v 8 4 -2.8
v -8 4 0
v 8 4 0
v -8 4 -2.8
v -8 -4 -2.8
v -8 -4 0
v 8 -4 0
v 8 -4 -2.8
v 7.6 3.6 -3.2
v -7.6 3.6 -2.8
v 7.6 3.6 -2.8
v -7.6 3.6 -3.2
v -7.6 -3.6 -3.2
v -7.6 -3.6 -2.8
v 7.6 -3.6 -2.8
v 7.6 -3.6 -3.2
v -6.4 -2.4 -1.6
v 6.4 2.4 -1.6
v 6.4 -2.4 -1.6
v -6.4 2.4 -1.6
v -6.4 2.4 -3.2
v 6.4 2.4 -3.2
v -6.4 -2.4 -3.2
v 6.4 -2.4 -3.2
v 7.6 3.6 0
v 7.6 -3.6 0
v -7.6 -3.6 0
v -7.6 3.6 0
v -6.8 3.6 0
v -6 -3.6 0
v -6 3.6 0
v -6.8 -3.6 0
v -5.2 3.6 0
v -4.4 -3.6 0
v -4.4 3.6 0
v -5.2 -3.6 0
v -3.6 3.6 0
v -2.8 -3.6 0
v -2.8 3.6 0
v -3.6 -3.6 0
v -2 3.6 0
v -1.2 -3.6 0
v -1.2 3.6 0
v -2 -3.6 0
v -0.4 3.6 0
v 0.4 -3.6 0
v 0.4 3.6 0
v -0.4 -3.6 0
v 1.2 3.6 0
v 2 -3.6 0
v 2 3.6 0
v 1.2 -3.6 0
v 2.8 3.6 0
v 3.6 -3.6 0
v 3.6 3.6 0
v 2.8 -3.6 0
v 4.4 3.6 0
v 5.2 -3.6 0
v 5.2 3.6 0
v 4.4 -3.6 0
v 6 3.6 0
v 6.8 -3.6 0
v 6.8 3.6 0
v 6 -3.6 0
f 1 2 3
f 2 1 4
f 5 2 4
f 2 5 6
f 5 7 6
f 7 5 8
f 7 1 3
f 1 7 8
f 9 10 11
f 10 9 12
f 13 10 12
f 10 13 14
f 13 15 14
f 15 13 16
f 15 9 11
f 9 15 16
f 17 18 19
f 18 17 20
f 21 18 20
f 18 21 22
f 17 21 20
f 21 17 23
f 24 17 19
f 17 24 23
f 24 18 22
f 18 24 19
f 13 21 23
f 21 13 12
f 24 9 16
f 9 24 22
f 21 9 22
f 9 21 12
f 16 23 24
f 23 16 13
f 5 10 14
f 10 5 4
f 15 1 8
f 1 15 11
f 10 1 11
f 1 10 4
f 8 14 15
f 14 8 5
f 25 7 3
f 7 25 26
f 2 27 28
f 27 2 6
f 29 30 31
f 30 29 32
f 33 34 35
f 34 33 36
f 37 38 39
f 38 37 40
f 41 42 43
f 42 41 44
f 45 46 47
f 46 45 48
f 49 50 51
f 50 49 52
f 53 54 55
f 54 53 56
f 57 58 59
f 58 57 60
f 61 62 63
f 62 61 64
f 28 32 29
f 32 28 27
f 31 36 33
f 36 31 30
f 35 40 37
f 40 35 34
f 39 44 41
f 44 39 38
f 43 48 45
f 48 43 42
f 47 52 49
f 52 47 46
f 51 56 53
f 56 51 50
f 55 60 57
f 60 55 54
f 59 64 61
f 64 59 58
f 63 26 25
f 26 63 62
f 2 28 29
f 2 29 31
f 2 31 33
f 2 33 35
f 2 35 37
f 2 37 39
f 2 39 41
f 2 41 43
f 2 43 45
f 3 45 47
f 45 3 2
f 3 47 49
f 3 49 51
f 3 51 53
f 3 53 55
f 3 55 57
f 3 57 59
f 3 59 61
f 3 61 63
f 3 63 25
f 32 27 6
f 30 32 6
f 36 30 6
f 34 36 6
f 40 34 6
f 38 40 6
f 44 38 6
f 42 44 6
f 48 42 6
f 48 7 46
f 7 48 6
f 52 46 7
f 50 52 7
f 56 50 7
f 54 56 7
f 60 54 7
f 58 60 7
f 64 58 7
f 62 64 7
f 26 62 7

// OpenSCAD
// file: ../p/4-4edge.scad
use <../lib.scad>
$fa=1; $fs=0.2;
function ldraw_lib__4_4edge(realsolid=false) = [
// 0 Circle 1.0
// 0 Name: 4-4edge.dat
// 0 Author: James Jessiman
// 0 !LDRAW_ORG Primitive UPDATE 2017-01
// 0 !LICENSE Licensed under CC BY 2.0 and CC BY 4.0 : see CAreadme.txt
// 
// 0 BFC CERTIFY CCW
  [0,"BFC","CERTIFY"],
  [0,"BFC","CCW"],
// 
// 0 !HISTORY 1998-12-15 [PTadmin] Official Update 1998-10
// 0 !HISTORY 2005-12-28 [PTadmin] Official Update 2005-01
// 0 !HISTORY 2007-06-24 [PTadmin] Header formatted for Contributor Agreement
// 0 !HISTORY 2008-07-01 [PTadmin] Official Update 2008-01
// 0 !HISTORY 2017-01-15 [Steffen] BFCed
// 0 !HISTORY 2017-12-30 [PTadmin] Official Update 2017-01
// 
// 
// 2 24 1 0 0 0.9239 0 0.3827
  [2,24,1,0,0,0.9239,0,0.3827],
// 2 24 0.9239 0 0.3827 0.7071 0 0.7071
  [2,24,0.9239,0,0.3827,0.7071,0,0.7071],
// 2 24 0.7071 0 0.7071 0.3827 0 0.9239
  [2,24,0.7071,0,0.7071,0.3827,0,0.9239],
// 2 24 0.3827 0 0.9239 0 0 1
  [2,24,0.3827,0,0.9239,0,0,1],
// 2 24 0 0 1 -0.3827 0 0.9239
  [2,24,0,0,1,-0.3827,0,0.9239],
// 2 24 -0.3827 0 0.9239 -0.7071 0 0.7071
  [2,24,-0.3827,0,0.9239,-0.7071,0,0.7071],
// 2 24 -0.7071 0 0.7071 -0.9239 0 0.3827
  [2,24,-0.7071,0,0.7071,-0.9239,0,0.3827],
// 2 24 -0.9239 0 0.3827 -1 0 -0
  [2,24,-0.9239,0,0.3827,-1,0,-0],
// 2 24 -1 0 -0 -0.9239 0 -0.3827
  [2,24,-1,0,-0,-0.9239,0,-0.3827],
// 2 24 -0.9239 0 -0.3827 -0.7071 0 -0.7071
  [2,24,-0.9239,0,-0.3827,-0.7071,0,-0.7071],
// 2 24 -0.7071 0 -0.7071 -0.3827 0 -0.9239
  [2,24,-0.7071,0,-0.7071,-0.3827,0,-0.9239],
// 2 24 -0.3827 0 -0.9239 0 0 -1
  [2,24,-0.3827,0,-0.9239,0,0,-1],
// 2 24 0 0 -1 0.3827 0 -0.9239
  [2,24,0,0,-1,0.3827,0,-0.9239],
// 2 24 0.3827 0 -0.9239 0.7071 0 -0.7071
  [2,24,0.3827,0,-0.9239,0.7071,0,-0.7071],
// 2 24 0.7071 0 -0.7071 0.9239 0 -0.3827
  [2,24,0.7071,0,-0.7071,0.9239,0,-0.3827],
// 2 24 0.9239 0 -0.3827 1 0 0
  [2,24,0.9239,0,-0.3827,1,0,0],
];
module ldraw_lib__4_4edge(step=0, col=false, unit=2/5, alt=false, line=0.2, solid=!$preview)
    makepoly(ldraw_lib__4_4edge(solid), step=step, col=col, unit=unit, alt=alt, line=line, solid=solid);
ldraw_lib__4_4edge(line=0.2);
// file: ../p/4-4disc.scad
use <../lib.scad>
$fa=1; $fs=0.2;
function ldraw_lib__4_4disc(realsolid=false) = [
// 0 Disc 1.0
// 0 Name: 4-4disc.dat
// 0 Author: James Jessiman
// 0 !LDRAW_ORG Primitive UPDATE 2002-02
// 0 !LICENSE Licensed under CC BY 2.0 and CC BY 4.0 : see CAreadme.txt
// 
// 0 BFC CERTIFY CCW
  [0,"BFC","CERTIFY"],
  [0,"BFC","CCW"],
// 
// 0 !HISTORY 1998-12-15 [PTadmin] Official Update 1998-10
// 0 !HISTORY 2002-03-23 [sbliss] Added BFC statement
// 0 !HISTORY 2002-04-25 [PTadmin] Official Update 2002-02
// 0 !HISTORY 2007-06-24 [PTadmin] Header formatted for Contributor Agreement
// 0 !HISTORY 2008-07-01 [PTadmin] Official Update 2008-01
// 
// 
// 3 16 0 0 0 1 0 0 0.9239 0 0.3827
  [3,16,0,0,0,1,0,0,0.9239,0,0.3827],
// 3 16 0 0 0 0.9239 0 0.3827 0.7071 0 0.7071
  [3,16,0,0,0,0.9239,0,0.3827,0.7071,0,0.7071],
// 3 16 0 0 0 0.7071 0 0.7071 0.3827 0 0.9239
  [3,16,0,0,0,0.7071,0,0.7071,0.3827,0,0.9239],
// 3 16 0 0 0 0.3827 0 0.9239 0 0 1
  [3,16,0,0,0,0.3827,0,0.9239,0,0,1],
// 3 16 0 0 0 0 0 1 -0.3827 0 0.9239
  [3,16,0,0,0,0,0,1,-0.3827,0,0.9239],
// 3 16 0 0 0 -0.3827 0 0.9239 -0.7071 0 0.7071
  [3,16,0,0,0,-0.3827,0,0.9239,-0.7071,0,0.7071],
// 3 16 0 0 0 -0.7071 0 0.7071 -0.9239 0 0.3827
  [3,16,0,0,0,-0.7071,0,0.7071,-0.9239,0,0.3827],
// 3 16 0 0 0 -0.9239 0 0.3827 -1 0 -0
  [3,16,0,0,0,-0.9239,0,0.3827,-1,0,-0],
// 3 16 0 0 0 -1 0 -0 -0.9239 0 -0.3827
  [3,16,0,0,0,-1,0,-0,-0.9239,0,-0.3827],
// 3 16 0 0 0 -0.9239 0 -0.3827 -0.7071 0 -0.7071
  [3,16,0,0,0,-0.9239,0,-0.3827,-0.7071,0,-0.7071],
// 3 16 0 0 0 -0.7071 0 -0.7071 -0.3827 0 -0.9239
  [3,16,0,0,0,-0.7071,0,-0.7071,-0.3827,0,-0.9239],
// 3 16 0 0 0 -0.3827 0 -0.9239 0 0 -1
  [3,16,0,0,0,-0.3827,0,-0.9239,0,0,-1],
// 3 16 0 0 0 0 0 -1 0.3827 0 -0.9239
  [3,16,0,0,0,0,0,-1,0.3827,0,-0.9239],
// 3 16 0 0 0 0.3827 0 -0.9239 0.7071 0 -0.7071
  [3,16,0,0,0,0.3827,0,-0.9239,0.7071,0,-0.7071],
// 3 16 0 0 0 0.7071 0 -0.7071 0.9239 0 -0.3827
  [3,16,0,0,0,0.7071,0,-0.7071,0.9239,0,-0.3827],
// 3 16 0 0 0 0.9239 0 -0.3827 1 0 0
  [3,16,0,0,0,0.9239,0,-0.3827,1,0,0],
// 0
];
module ldraw_lib__4_4disc(step=0, col=false, unit=2/5, alt=false, line=0.2, solid=!$preview)
    makepoly(ldraw_lib__4_4disc(solid), step=step, col=col, unit=unit, alt=alt, line=line, solid=solid);
ldraw_lib__4_4disc(line=0.2);
// file: ../p/4-4cyli.scad
use <../lib.scad>
$fa=1; $fs=0.2;
function ldraw_lib__4_4cyli(realsolid=false) = [
// 0 Cylinder 1.0
// 0 Name: 4-4cyli.dat
// 0 Author: James Jessiman
// 0 !LDRAW_ORG Primitive UPDATE 2005-01
// 0 !LICENSE Licensed under CC BY 2.0 and CC BY 4.0 : see CAreadme.txt
// 
// 0 BFC CERTIFY CCW
  [0,"BFC","CERTIFY"],
  [0,"BFC","CCW"],
// 
// 0 !HISTORY 1998-12-15 [PTadmin] Official Update 1998-10
// 0 !HISTORY 2002-03-23 [sbliss] Added BFC statement; merged headers from files in distributions LDraw 0.27 and Complete.
// 0 !HISTORY 2002-04-25 [PTadmin] Official Update 2002-02
// 0 !HISTORY 2004-12-14 [guyvivan] BFC CCW
// 0 !HISTORY 2005-12-28 [PTadmin] Official Update 2005-01
// 0 !HISTORY 2007-06-24 [PTadmin] Header formatted for Contributor Agreement
// 0 !HISTORY 2008-07-01 [PTadmin] Official Update 2008-01
// 
// 
// 4 16 1 1 0 0.9239 1 0.3827 0.9239 0 0.3827 1 0 0
  [4,16,1,1,0,0.9239,1,0.3827,0.9239,0,0.3827,1,0,0],
// 5 24 1 0 0 1 1 0 0.9239 0 0.3827 0.9239 0 -0.3827
  [5,24,1,0,0,1,1,0,0.9239,0,0.3827,0.9239,0,-0.3827],
// 4 16 0.9239 1 0.3827 0.7071 1 0.7071 0.7071 0 0.7071 0.9239 0 0.3827
  [4,16,0.9239,1,0.3827,0.7071,1,0.7071,0.7071,0,0.7071,0.9239,0,0.3827],
// 5 24 0.9239 0 0.3827 0.9239 1 0.3827 0.7071 0 0.7071 1 0 0
  [5,24,0.9239,0,0.3827,0.9239,1,0.3827,0.7071,0,0.7071,1,0,0],
// 4 16 0.7071 1 0.7071 0.3827 1 0.9239 0.3827 0 0.9239 0.7071 0 0.7071
  [4,16,0.7071,1,0.7071,0.3827,1,0.9239,0.3827,0,0.9239,0.7071,0,0.7071],
// 5 24 0.7071 0 0.7071 0.7071 1 0.7071 0.3827 0 0.9239 0.9239 0 0.3827
  [5,24,0.7071,0,0.7071,0.7071,1,0.7071,0.3827,0,0.9239,0.9239,0,0.3827],
// 4 16 0.3827 1 0.9239 0 1 1 0 0 1 0.3827 0 0.9239
  [4,16,0.3827,1,0.9239,0,1,1,0,0,1,0.3827,0,0.9239],
// 5 24 0.3827 0 0.9239 0.3827 1 0.9239 0 0 1 0.7071 0 0.7071
  [5,24,0.3827,0,0.9239,0.3827,1,0.9239,0,0,1,0.7071,0,0.7071],
// 4 16 0 1 1 -0.3827 1 0.9239 -0.3827 0 0.9239 0 0 1
  [4,16,0,1,1,-0.3827,1,0.9239,-0.3827,0,0.9239,0,0,1],
// 5 24 0 0 1 0 1 1 -0.3827 0 0.9239 0.3827 0 0.9239
  [5,24,0,0,1,0,1,1,-0.3827,0,0.9239,0.3827,0,0.9239],
// 4 16 -0.3827 1 0.9239 -0.7071 1 0.7071 -0.7071 0 0.7071 -0.3827 0 0.9239
  [4,16,-0.3827,1,0.9239,-0.7071,1,0.7071,-0.7071,0,0.7071,-0.3827,0,0.9239],
// 5 24 -0.3827 0 0.9239 -0.3827 1 0.9239 -0.7071 0 0.7071 0 0 1
  [5,24,-0.3827,0,0.9239,-0.3827,1,0.9239,-0.7071,0,0.7071,0,0,1],
// 4 16 -0.7071 1 0.7071 -0.9239 1 0.3827 -0.9239 0 0.3827 -0.7071 0 0.7071
  [4,16,-0.7071,1,0.7071,-0.9239,1,0.3827,-0.9239,0,0.3827,-0.7071,0,0.7071],
// 5 24 -0.7071 0 0.7071 -0.7071 1 0.7071 -0.9239 0 0.3827 -0.3827 0 0.9239
  [5,24,-0.7071,0,0.7071,-0.7071,1,0.7071,-0.9239,0,0.3827,-0.3827,0,0.9239],
// 4 16 -0.9239 1 0.3827 -1 1 0 -1 0 0 -0.9239 0 0.3827
  [4,16,-0.9239,1,0.3827,-1,1,0,-1,0,0,-0.9239,0,0.3827],
// 5 24 -0.9239 0 0.3827 -0.9239 1 0.3827 -1 0 0 -0.7071 0 0.7071
  [5,24,-0.9239,0,0.3827,-0.9239,1,0.3827,-1,0,0,-0.7071,0,0.7071],
// 4 16 -1 1 0 -0.9239 1 -0.3827 -0.9239 0 -0.3827 -1 0 0
  [4,16,-1,1,0,-0.9239,1,-0.3827,-0.9239,0,-0.3827,-1,0,0],
// 5 24 -1 0 0 -1 1 0 -0.9239 0 -0.3827 -0.9239 0 0.3827
  [5,24,-1,0,0,-1,1,0,-0.9239,0,-0.3827,-0.9239,0,0.3827],
// 4 16 -0.9239 1 -0.3827 -0.7071 1 -0.7071 -0.7071 0 -0.7071 -0.9239 0 -0.3827
  [4,16,-0.9239,1,-0.3827,-0.7071,1,-0.7071,-0.7071,0,-0.7071,-0.9239,0,-0.3827],
// 5 24 -0.9239 0 -0.3827 -0.9239 1 -0.3827 -0.7071 0 -0.7071 -1 0 0
  [5,24,-0.9239,0,-0.3827,-0.9239,1,-0.3827,-0.7071,0,-0.7071,-1,0,0],
// 4 16 -0.7071 1 -0.7071 -0.3827 1 -0.9239 -0.3827 0 -0.9239 -0.7071 0 -0.7071
  [4,16,-0.7071,1,-0.7071,-0.3827,1,-0.9239,-0.3827,0,-0.9239,-0.7071,0,-0.7071],
// 5 24 -0.7071 0 -0.7071 -0.7071 1 -0.7071 -0.3827 0 -0.9239 -0.9239 0 -0.3827
  [5,24,-0.7071,0,-0.7071,-0.7071,1,-0.7071,-0.3827,0,-0.9239,-0.9239,0,-0.3827],
// 4 16 -0.3827 1 -0.9239 0 1 -1 0 0 -1 -0.3827 0 -0.9239
  [4,16,-0.3827,1,-0.9239,0,1,-1,0,0,-1,-0.3827,0,-0.9239],
// 5 24 -0.3827 0 -0.9239 -0.3827 1 -0.9239 0 0 -1 -0.7071 0 -0.7071
  [5,24,-0.3827,0,-0.9239,-0.3827,1,-0.9239,0,0,-1,-0.7071,0,-0.7071],
// 4 16 0 1 -1 0.3827 1 -0.9239 0.3827 0 -0.9239 0 0 -1
  [4,16,0,1,-1,0.3827,1,-0.9239,0.3827,0,-0.9239,0,0,-1],
// 5 24 0 0 -1 0 1 -1 0.3827 0 -0.9239 -0.3827 0 -0.9239
  [5,24,0,0,-1,0,1,-1,0.3827,0,-0.9239,-0.3827,0,-0.9239],
// 4 16 0.3827 1 -0.9239 0.7071 1 -0.7071 0.7071 0 -0.7071 0.3827 0 -0.9239
  [4,16,0.3827,1,-0.9239,0.7071,1,-0.7071,0.7071,0,-0.7071,0.3827,0,-0.9239],
// 5 24 0.3827 0 -0.9239 0.3827 1 -0.9239 0.7071 0 -0.7071 0 0 -1
  [5,24,0.3827,0,-0.9239,0.3827,1,-0.9239,0.7071,0,-0.7071,0,0,-1],
// 4 16 0.7071 1 -0.7071 0.9239 1 -0.3827 0.9239 0 -0.3827 0.7071 0 -0.7071
  [4,16,0.7071,1,-0.7071,0.9239,1,-0.3827,0.9239,0,-0.3827,0.7071,0,-0.7071],
// 5 24 0.7071 0 -0.7071 0.7071 1 -0.7071 0.9239 0 -0.3827 0.3827 0 -0.9239
  [5,24,0.7071,0,-0.7071,0.7071,1,-0.7071,0.9239,0,-0.3827,0.3827,0,-0.9239],
// 4 16 0.9239 1 -0.3827 1 1 0 1 0 0 0.9239 0 -0.3827
  [4,16,0.9239,1,-0.3827,1,1,0,1,0,0,0.9239,0,-0.3827],
// 5 24 0.9239 0 -0.3827 0.9239 1 -0.3827 1 0 0 0.7071 0 -0.7071
  [5,24,0.9239,0,-0.3827,0.9239,1,-0.3827,1,0,0,0.7071,0,-0.7071],
// 0
];
module ldraw_lib__4_4cyli(step=0, col=false, unit=2/5, alt=false, line=0.2, solid=!$preview)
    makepoly(ldraw_lib__4_4cyli(solid), step=step, col=col, unit=unit, alt=alt, line=line, solid=solid);
ldraw_lib__4_4cyli(line=0.2);
// file: ../p/stud3.scad
use <../lib.scad>
use <4-4cyli.scad>
use <4-4disc.scad>
use <4-4edge.scad>
$fa=1; $fs=0.2;
function ldraw_lib__stud3(realsolid=false) = realsolid ? 
    [openscad(translate([0,0,-eps()], o=cylinder(4+eps(), r=4)),2)] : [
// 0 Stud Tube Solid
// 0 Name: stud3.dat
// 0 Author: James Jessiman
// 0 !LDRAW_ORG Primitive UPDATE 2012-01
// 0 !LICENSE Licensed under CC BY 2.0 and CC BY 4.0 : see CAreadme.txt
// 
// 0 BFC CERTIFY CCW
  [0,"BFC","CERTIFY"],
  [0,"BFC","CCW"],
// 
// 0 !HISTORY 2002-04-04 [sbliss] Modified for BFC compliance
// 0 !HISTORY 2002-04-25 [PTadmin] Official Update 2002-02
// 0 !HISTORY 2007-06-24 [PTadmin] Header formatted for Contributor Agreement
// 0 !HISTORY 2008-07-01 [PTadmin] Official Update 2008-01
// 0 !HISTORY 2012-02-16 [Philo] Changed to CCW
// 0 !HISTORY 2012-03-30 [PTadmin] Official Update 2012-01
// 
// 
// 1 16 0 -4 0 4 0 0 0 1 0 0 0 4 4-4edge.dat
  [1,16,0,-4,0,4,0,0,0,1,0,0,0,4, ldraw_lib__4_4edge(realsolid)],
// 1 16 0 0 0 4 0 0 0 1 0 0 0 4 4-4edge.dat
  [1,16,0,0,0,4,0,0,0,1,0,0,0,4, ldraw_lib__4_4edge(realsolid)],
// 1 16 0 -4 0 4 0 0 0 1 0 0 0 4 4-4disc.dat
  [1,16,0,-4,0,4,0,0,0,1,0,0,0,4, ldraw_lib__4_4disc(realsolid)],
// 1 16 0 -4 0 4 0 0 0 4 0 0 0 4 4-4cyli.dat
  [1,16,0,-4,0,4,0,0,0,4,0,0,0,4, ldraw_lib__4_4cyli(realsolid)],
];
module ldraw_lib__stud3(step=0, col=false, unit=2/5, alt=false, line=0.2, solid=!$preview)
    makepoly(ldraw_lib__stud3(solid), step=step, col=col, unit=unit, alt=alt, line=line, solid=solid);
ldraw_lib__stud3(line=0.2);
// file: ../p/stud.scad
use <../lib.scad>
use <4-4cyli.scad>
use <4-4disc.scad>
use <4-4edge.scad>
$fa=1; $fs=0.2;
function ldraw_lib__stud(realsolid=false) = realsolid ? 
    [openscad(translate([0,0,-eps()], o=cylinder(4+eps(), r=6)),2)] : [
// 0 Stud
// 0 Name: stud.dat
// 0 Author: James Jessiman
// 0 !LDRAW_ORG Primitive UPDATE 2012-01
// 0 !LICENSE Licensed under CC BY 2.0 and CC BY 4.0 : see CAreadme.txt
// 
// 0 BFC CERTIFY CCW
  [0,"BFC","CERTIFY"],
  [0,"BFC","CCW"],
// 
// 0 !HISTORY 2002-04-04 [sbliss] Modified for BFC compliance
// 0 !HISTORY 2002-04-25 [PTadmin] Official Update 2002-02
// 0 !HISTORY 2007-06-24 [PTadmin] Header formatted for Contributor Agreement
// 0 !HISTORY 2008-07-01 [PTadmin] Official Update 2008-01
// 0 !HISTORY 2012-02-16 [Philo] Changed to CCW
// 0 !HISTORY 2012-03-30 [PTadmin] Official Update 2012-01
// 
// 
// 1 16 0 0 0 6 0 0 0 1 0 0 0 6 4-4edge.dat
  [1,16,0,0,0,6,0,0,0,1,0,0,0,6, ldraw_lib__4_4edge(realsolid)],
// 1 16 0 -4 0 6 0 0 0 1 0 0 0 6 4-4edge.dat
  [1,16,0,-4,0,6,0,0,0,1,0,0,0,6, ldraw_lib__4_4edge(realsolid)],
// 1 16 0 0 0 6 0 0 0 -4 0 0 0 6 4-4cyli.dat
  [1,16,0,0,0,6,0,0,0,-4,0,0,0,6, ldraw_lib__4_4cyli(realsolid)],
// 1 16 0 -4 0 6 0 0 0 1 0 0 0 6 4-4disc.dat
  [1,16,0,-4,0,6,0,0,0,1,0,0,0,6, ldraw_lib__4_4disc(realsolid)],
];
module ldraw_lib__stud(step=0, col=false, unit=2/5, alt=false, line=0.2, solid=!$preview)
    makepoly(ldraw_lib__stud(solid), step=step, col=col, unit=unit, alt=alt, line=line, solid=solid);
ldraw_lib__stud(line=0.2);
// file: ../p/box4t.scad
use <../lib.scad>
$fa=1; $fs=0.2;
function ldraw_lib__box4t(realsolid=false) = [
// 0 Box with 4 Adjacent Faces and All Edges
// 0 Name: box4t.dat
// 0 Author: Tore Eriksson [Tore_Eriksson]
// 0 !LDRAW_ORG Primitive UPDATE 2003-02
// 0 !LICENSE Licensed under CC BY 2.0 and CC BY 4.0 : see CAreadme.txt
// 
// 0 BFC CERTIFY CCW
  [0,"BFC","CERTIFY"],
  [0,"BFC","CCW"],
// 
// 0 !HISTORY 1997-09-29 [PTadmin] Official Update 1997-15
// 0 !HISTORY 2002-08-31 [izanette] Modified with WINDZ for BFC compliance
// 0 !HISTORY 2003-08-01 [PTadmin] Official Update 2003-02
// 0 !HISTORY 2007-06-24 [PTadmin] Header formatted for Contributor Agreement
// 0 !HISTORY 2008-07-01 [PTadmin] Official Update 2008-01
// 
// 
// 2 24 1 1 1 -1 1 1
  [2,24,1,1,1,-1,1,1],
// 2 24 -1 1 1 -1 1 -1
  [2,24,-1,1,1,-1,1,-1],
// 2 24 -1 1 -1 1 1 -1
  [2,24,-1,1,-1,1,1,-1],
// 2 24 1 1 -1 1 1 1
  [2,24,1,1,-1,1,1,1],
// 2 24 1 0 1 -1 0 1
  [2,24,1,0,1,-1,0,1],
// 2 24 -1 0 1 -1 0 -1
  [2,24,-1,0,1,-1,0,-1],
// 2 24 -1 0 -1 1 0 -1
  [2,24,-1,0,-1,1,0,-1],
// 2 24 1 0 -1 1 0 1
  [2,24,1,0,-1,1,0,1],
// 2 24 1 0 1 1 1 1
  [2,24,1,0,1,1,1,1],
// 2 24 -1 0 1 -1 1 1
  [2,24,-1,0,1,-1,1,1],
// 2 24 1 0 -1 1 1 -1
  [2,24,1,0,-1,1,1,-1],
// 2 24 -1 0 -1 -1 1 -1
  [2,24,-1,0,-1,-1,1,-1],
// 4 16 1 1 1 1 1 -1 -1 1 -1 -1 1 1
  [4,16,1,1,1,1,1,-1,-1,1,-1,-1,1,1],
// 4 16 1 1 1 -1 1 1 -1 0 1 1 0 1
  [4,16,1,1,1,-1,1,1,-1,0,1,1,0,1],
// 4 16 -1 1 1 -1 1 -1 -1 0 -1 -1 0 1
  [4,16,-1,1,1,-1,1,-1,-1,0,-1,-1,0,1],
// 0 4 16 -1 1 -1 -1 0 -1 1 0 -1 1 1 -1
// 4 16 1 1 -1 1 1 1 1 0 1 1 0 -1
  [4,16,1,1,-1,1,1,1,1,0,1,1,0,-1],
// 0
];
module ldraw_lib__box4t(step=0, col=false, unit=2/5, alt=false, line=0.2, solid=!$preview)
    makepoly(ldraw_lib__box4t(solid), step=step, col=col, unit=unit, alt=alt, line=line, solid=solid);
ldraw_lib__box4t(line=0.2);
// file: s/3004s01.scad
use <../../lib.scad>
use <../../p/box4t.scad>
use <../../p/box5.scad>
use <../../p/stud.scad>
use <../../p/stud3.scad>
$fa=1; $fs=0.2;
function ldraw_lib__s__3004s01(realsolid=false) = [
// 0 ~Brick  1 x  2 without Front Face
// 0 Name: s\3004s01.dat
// 0 Author: James Jessiman
// 0 !LDRAW_ORG Subpart UPDATE 2003-03
// 0 !LICENSE Licensed under CC BY 2.0 and CC BY 4.0 : see CAreadme.txt
// 
// 0 BFC CERTIFY CCW
  [0,"BFC","CERTIFY"],
  [0,"BFC","CCW"],
// 
// 0 !HISTORY 2003-09-07 [jriley] Subfiling, BFC
// 0 !HISTORY 2003-12-19 [PTadmin] Official Update 2003-03
// 0 !HISTORY 2007-08-29 [PTadmin] Header formatted for Contributor Agreement
// 0 !HISTORY 2008-07-01 [PTadmin] Official Update 2008-01
// 
// 
// 1 16 0 4 0 1 0 0 0 -5 0 0 0 1 stud3.dat
  [1,16,0,4,0,1,0,0,0,-5,0,0,0,1, ldraw_lib__stud3(realsolid)],
// 0 BFC INVERTNEXT
  [0,"BFC","INVERTNEXT"],
// 1 16 0 24 0 16 0 0 0 -20 0 0 0 6 box5.dat
  [1,16,0,24,0,16,0,0,0,-20,0,0,0,6, ldraw_lib__box5(realsolid)],
// 4 16 20 24 10 16 24 6 -16 24 6 -20 24 10
  [4,16,20,24,10,16,24,6,-16,24,6,-20,24,10],
// 4 16 -20 24 10 -16 24 6 -16 24 -6 -20 24 -10
  [4,16,-20,24,10,-16,24,6,-16,24,-6,-20,24,-10],
// 4 16 -20 24 -10 -16 24 -6 16 24 -6 20 24 -10
  [4,16,-20,24,-10,-16,24,-6,16,24,-6,20,24,-10],
// 4 16 20 24 -10 16 24 -6 16 24 6 20 24 10
  [4,16,20,24,-10,16,24,-6,16,24,6,20,24,10],
// 1 16 0 24 0 20 0 0 0 -24 0 0 0 10 box4t.dat
  [1,16,0,24,0,20,0,0,0,-24,0,0,0,10, ldraw_lib__box4t(realsolid)],
// 1 16 10 0 0 1 0 0 0 1 0 0 0 1 stud.dat
  [1,16,10,0,0,1,0,0,0,1,0,0,0,1, ldraw_lib__stud(realsolid)],
// 1 16 -10 0 0 1 0 0 0 1 0 0 0 1 stud.dat
  [1,16,-10,0,0,1,0,0,0,1,0,0,0,1, ldraw_lib__stud(realsolid)],
// 0
];
module ldraw_lib__s__3004s01(step=0, col=false, unit=2/5, alt=false, line=0.2, solid=!$preview)
    makepoly(ldraw_lib__s__3004s01(solid), step=step, col=col, unit=unit, alt=alt, line=line, solid=solid);
ldraw_lib__s__3004s01(line=0.2);
// file: ../p/box5.scad
use <../lib.scad>
$fa=1; $fs=0.2;
function ldraw_lib__box5(realsolid=false) = [
// 0 Box with 5 Faces and All Edges
// 0 Name: box5.dat
// 0 Author: James Jessiman
// 0 !LDRAW_ORG Primitive UPDATE 2012-01
// 0 !LICENSE Licensed under CC BY 2.0 and CC BY 4.0 : see CAreadme.txt
// 
// 0 BFC CERTIFY CCW
  [0,"BFC","CERTIFY"],
  [0,"BFC","CCW"],
// 
// 0 !HISTORY 2002-04-03 [sbliss] Modified for BFC compliance
// 0 !HISTORY 2002-04-25 [PTadmin] Official Update 2002-02
// 0 !HISTORY 2007-06-24 [PTadmin] Header formatted for Contributor Agreement
// 0 !HISTORY 2008-07-01 [PTadmin] Official Update 2008-01
// 0 !HISTORY 2012-02-16 [Philo] Changed to CCW
// 0 !HISTORY 2012-03-30 [PTadmin] Official Update 2012-01
// 
// 
// 2 24 1 1 1 -1 1 1
  [2,24,1,1,1,-1,1,1],
// 2 24 -1 1 1 -1 1 -1
  [2,24,-1,1,1,-1,1,-1],
// 2 24 -1 1 -1 1 1 -1
  [2,24,-1,1,-1,1,1,-1],
// 2 24 1 1 -1 1 1 1
  [2,24,1,1,-1,1,1,1],
// 2 24 1 0 1 -1 0 1
  [2,24,1,0,1,-1,0,1],
// 2 24 -1 0 1 -1 0 -1
  [2,24,-1,0,1,-1,0,-1],
// 2 24 -1 0 -1 1 0 -1
  [2,24,-1,0,-1,1,0,-1],
// 2 24 1 0 -1 1 0 1
  [2,24,1,0,-1,1,0,1],
// 2 24 1 0 1 1 1 1
  [2,24,1,0,1,1,1,1],
// 2 24 -1 0 1 -1 1 1
  [2,24,-1,0,1,-1,1,1],
// 2 24 1 0 -1 1 1 -1
  [2,24,1,0,-1,1,1,-1],
// 2 24 -1 0 -1 -1 1 -1
  [2,24,-1,0,-1,-1,1,-1],
// 4 16 -1 1 1 1 1 1 1 1 -1 -1 1 -1
  [4,16,-1,1,1,1,1,1,1,1,-1,-1,1,-1],
// 4 16 -1 1 1 -1 0 1 1 0 1 1 1 1
  [4,16,-1,1,1,-1,0,1,1,0,1,1,1,1],
// 4 16 -1 1 -1 -1 0 -1 -1 0 1 -1 1 1
  [4,16,-1,1,-1,-1,0,-1,-1,0,1,-1,1,1],
// 4 16 1 1 -1 1 0 -1 -1 0 -1 -1 1 -1
  [4,16,1,1,-1,1,0,-1,-1,0,-1,-1,1,-1],
// 4 16 1 1 1 1 0 1 1 0 -1 1 1 -1
  [4,16,1,1,1,1,0,1,1,0,-1,1,1,-1],
];
module ldraw_lib__box5(step=0, col=false, unit=2/5, alt=false, line=0.2, solid=!$preview)
    makepoly(ldraw_lib__box5(solid), step=step, col=col, unit=unit, alt=alt, line=line, solid=solid);
ldraw_lib__box5(line=0.2);
// file: ../p/box4.scad
use <../lib.scad>
$fa=1; $fs=0.2;
function ldraw_lib__box4(realsolid=false) = [
// 0 Box with 4 Faces (2 Parallel Pairs) and All Edges
// 0 Name: box4.dat
// 0 Author: James Jessiman
// 0 !LDRAW_ORG Primitive UPDATE 2012-01
// 0 !LICENSE Licensed under CC BY 2.0 and CC BY 4.0 : see CAreadme.txt
// 
// 0 BFC CERTIFY CCW
  [0,"BFC","CERTIFY"],
  [0,"BFC","CCW"],
// 
// 0 !HISTORY 2002-04-03 [sbliss] Modified for BFC compliance
// 0 !HISTORY 2002-04-25 [PTadmin] Official Update 2002-02
// 0 !HISTORY 2007-06-24 [PTadmin] Header formatted for Contributor Agreement
// 0 !HISTORY 2008-07-01 [PTadmin] Official Update 2008-01
// 0 !HISTORY 2012-02-16 [Philo] Changed to CCW
// 0 !HISTORY 2012-03-30 [PTadmin] Official Update 2012-01
// 
// 
// 2 24 1 1 1 -1 1 1
  [2,24,1,1,1,-1,1,1],
// 2 24 -1 1 1 -1 1 -1
  [2,24,-1,1,1,-1,1,-1],
// 2 24 -1 1 -1 1 1 -1
  [2,24,-1,1,-1,1,1,-1],
// 2 24 1 1 -1 1 1 1
  [2,24,1,1,-1,1,1,1],
// 2 24 1 0 1 -1 0 1
  [2,24,1,0,1,-1,0,1],
// 2 24 -1 0 1 -1 0 -1
  [2,24,-1,0,1,-1,0,-1],
// 2 24 -1 0 -1 1 0 -1
  [2,24,-1,0,-1,1,0,-1],
// 2 24 1 0 -1 1 0 1
  [2,24,1,0,-1,1,0,1],
// 2 24 1 0 1 1 1 1
  [2,24,1,0,1,1,1,1],
// 2 24 -1 0 1 -1 1 1
  [2,24,-1,0,1,-1,1,1],
// 2 24 1 0 -1 1 1 -1
  [2,24,1,0,-1,1,1,-1],
// 2 24 -1 0 -1 -1 1 -1
  [2,24,-1,0,-1,-1,1,-1],
// 4 16 -1 1 1 -1 0 1 1 0 1 1 1 1
  [4,16,-1,1,1,-1,0,1,1,0,1,1,1,1],
// 4 16 -1 1 -1 -1 0 -1 -1 0 1 -1 1 1
  [4,16,-1,1,-1,-1,0,-1,-1,0,1,-1,1,1],
// 4 16 1 1 -1 1 0 -1 -1 0 -1 -1 1 -1
  [4,16,1,1,-1,1,0,-1,-1,0,-1,-1,1,-1],
// 4 16 1 1 1 1 0 1 1 0 -1 1 1 -1
  [4,16,1,1,1,1,0,1,1,0,-1,1,1,-1],
];
module ldraw_lib__box4(step=0, col=false, unit=2/5, alt=false, line=0.2, solid=!$preview)
    makepoly(ldraw_lib__box4(solid), step=step, col=col, unit=unit, alt=alt, line=line, solid=solid);
ldraw_lib__box4(line=0.2);
// file: 3004.scad
use <../lib.scad>
use <s/3004s01.scad>
$fa=1; $fs=0.2;
function ldraw_lib__3004(realsolid=false) = [
// 0 Brick  1 x  2
// 0 Name: 3004.dat
// 0 Author: James Jessiman
// 0 !LDRAW_ORG Part UPDATE 2022-05
// 0 !LICENSE Licensed under CC BY 2.0 and CC BY 4.0 : see CAreadme.txt
// 
// 0 BFC CERTIFY CCW
  [0,"BFC","CERTIFY"],
  [0,"BFC","CCW"],
// 
// 0 !HISTORY 2001-10-26 [PTadmin] Official Update 2001-01
// 0 !HISTORY 2002-05-07 {unknown} BFC Certification
// 0 !HISTORY 2002-06-11 [PTadmin] Official Update 2002-03
// 0 !HISTORY 2007-05-07 [PTadmin] Header formatted for Contributor Agreement
// 0 !HISTORY 2008-07-01 [PTadmin] Official Update 2008-01
// 0 !HISTORY 2022-08-04 [MagFors] Using subfile
// 0 !HISTORY 2022-09-15 [PTadmin] Official Update 2022-05
// 
// 
// 1 16 0 0 0 1 0 0 0 1 0 0 0 1 s\3004s01.dat
  [1,16,0,0,0,1,0,0,0,1,0,0,0,1, ldraw_lib__s__3004s01(realsolid)],
// 4 16 -20 24 -10 20 24 -10 20 0 -10 -20 0 -10
  [4,16,-20,24,-10,20,24,-10,20,0,-10,-20,0,-10],
];
module ldraw_lib__3004(step=0, col=false, unit=2/5, alt=false, line=0.2, solid=!$preview)
    makepoly(ldraw_lib__3004(solid), step=step, col=col, unit=unit, alt=alt, line=line, solid=solid);
ldraw_lib__3004(line=0.2);
// file: s/3069bs01.scad
use <../../lib.scad>
use <../../p/box4.scad>
use <../../p/box5.scad>
$fa=1; $fs=0.2;
function ldraw_lib__s__3069bs01(realsolid=false) = [
// 0 ~Tile  1 x  2 with Groove without Top Face
// 0 Name: s\3069bs01.dat
// 0 Author: Santeri Piippo [arezey]
// 0 !LDRAW_ORG Subpart UPDATE 2010-02
// 0 !LICENSE Licensed under CC BY 2.0 and CC BY 4.0 : see CAreadme.txt
// 
// 0 BFC CERTIFY CCW
  [0,"BFC","CERTIFY"],
  [0,"BFC","CCW"],
// 
// 0 !HISTORY 2010-07-05 [PTadmin] Official Update 2010-02
// 
// 
// 1 16 0 0 0 20 0 0 0 7 0 0 0 10 box4.dat
  [1,16,0,0,0,20,0,0,0,7,0,0,0,10, ldraw_lib__box4(realsolid)],
// 1 16 0 7 0 19 0 0 0 1 0 0 0 9 box4.dat
  [1,16,0,7,0,19,0,0,0,1,0,0,0,9, ldraw_lib__box4(realsolid)],
// 0 BFC INVERTNEXT
  [0,"BFC","INVERTNEXT"],
// 1 16 0 8 0 16 0 0 0 -4 0 0 0 6 box5.dat
  [1,16,0,8,0,16,0,0,0,-4,0,0,0,6, ldraw_lib__box5(realsolid)],
// 4 16 -19 8 9 -16 8 6 -16 8 -6 -19 8 -9
  [4,16,-19,8,9,-16,8,6,-16,8,-6,-19,8,-9],
// 4 16 19 8 -9 16 8 -6 16 8 6 19 8 9
  [4,16,19,8,-9,16,8,-6,16,8,6,19,8,9],
// 4 16 19 8 9 16 8 6 -16 8 6 -19 8 9
  [4,16,19,8,9,16,8,6,-16,8,6,-19,8,9],
// 4 16 -19 8 -9 -16 8 -6 16 8 -6 19 8 -9
  [4,16,-19,8,-9,-16,8,-6,16,8,-6,19,8,-9],
// 4 16 -20 7 10 -19 7 9 -19 7 -9 -20 7 -10
  [4,16,-20,7,10,-19,7,9,-19,7,-9,-20,7,-10],
// 4 16 20 7 -10 19 7 -9 19 7 9 20 7 10
  [4,16,20,7,-10,19,7,-9,19,7,9,20,7,10],
// 4 16 20 7 10 19 7 9 -19 7 9 -20 7 10
  [4,16,20,7,10,19,7,9,-19,7,9,-20,7,10],
// 4 16 -20 7 -10 -19 7 -9 19 7 -9 20 7 -10
  [4,16,-20,7,-10,-19,7,-9,19,7,-9,20,7,-10],
// 0 //
];
module ldraw_lib__s__3069bs01(step=0, col=false, unit=2/5, alt=false, line=0.2, solid=!$preview)
    makepoly(ldraw_lib__s__3069bs01(solid), step=step, col=col, unit=unit, alt=alt, line=line, solid=solid);
ldraw_lib__s__3069bs01(line=0.2);
// main file
use <../lib.scad>
use <s/3069bs01.scad>
$fa=1; $fs=0.2;
function ldraw_lib__3069bp0h(realsolid=false) = [
// 0 Tile  1 x  2 with Black Grille with 10 Stripes Pattern
// 0 Name: 3069bp0h.dat
// 0 Author: Philippe Hurbain [Philo]
// 0 !LDRAW_ORG Part UPDATE 2019-02
// 0 !LICENSE Licensed under CC BY 2.0 and CC BY 4.0 : see CAreadme.txt
// 
// 0 BFC CERTIFY CCW
  [0,"BFC","CERTIFY"],
  [0,"BFC","CCW"],
// 
// 0 !KEYWORDS Bricklink 3069bpb660, Set 10262
// 
// 0 !HISTORY 2019-09-09 [PTadmin] Official Update 2019-02
// 
// 
// 1 16 0 0 0 1 0 0 0 1 0 0 0 1 s\3069bs01.dat
  [1,16,0,0,0,1,0,0,0,1,0,0,0,1, ldraw_lib__s__3069bs01(realsolid)],
// 4 16 20 0 10 19 0 9 19 0 -9 20 0 -10
  [4,16,20,0,10,19,0,9,19,0,-9,20,0,-10],
// 4 16 -20 0 -10 -19 0 -9 -19 0 9 -20 0 10
  [4,16,-20,0,-10,-19,0,-9,-19,0,9,-20,0,10],
// 4 16 -17 0 9 -17 0 -9 -15 0 -9 -15 0 9
  [4,16,-17,0,9,-17,0,-9,-15,0,-9,-15,0,9],
// 4 16 -13 0 9 -13 0 -9 -11 0 -9 -11 0 9
  [4,16,-13,0,9,-13,0,-9,-11,0,-9,-11,0,9],
// 4 16 -9 0 9 -9 0 -9 -7 0 -9 -7 0 9
  [4,16,-9,0,9,-9,0,-9,-7,0,-9,-7,0,9],
// 4 16 -5 0 9 -5 0 -9 -3 0 -9 -3 0 9
  [4,16,-5,0,9,-5,0,-9,-3,0,-9,-3,0,9],
// 4 16 -1 0 9 -1 0 -9 1 0 -9 1 0 9
  [4,16,-1,0,9,-1,0,-9,1,0,-9,1,0,9],
// 4 16 3 0 9 3 0 -9 5 0 -9 5 0 9
  [4,16,3,0,9,3,0,-9,5,0,-9,5,0,9],
// 4 16 7 0 9 7 0 -9 9 0 -9 9 0 9
  [4,16,7,0,9,7,0,-9,9,0,-9,9,0,9],
// 4 16 11 0 9 11 0 -9 13 0 -9 13 0 9
  [4,16,11,0,9,11,0,-9,13,0,-9,13,0,9],
// 4 16 15 0 9 15 0 -9 17 0 -9 17 0 9
  [4,16,15,0,9,15,0,-9,17,0,-9,17,0,9],
// 4 0 -19 0 9 -19 0 -9 -17 0 -9 -17 0 9
  [4,0,-19,0,9,-19,0,-9,-17,0,-9,-17,0,9],
// 4 0 -15 0 9 -15 0 -9 -13 0 -9 -13 0 9
  [4,0,-15,0,9,-15,0,-9,-13,0,-9,-13,0,9],
// 4 0 -11 0 9 -11 0 -9 -9 0 -9 -9 0 9
  [4,0,-11,0,9,-11,0,-9,-9,0,-9,-9,0,9],
// 4 0 -7 0 9 -7 0 -9 -5 0 -9 -5 0 9
  [4,0,-7,0,9,-7,0,-9,-5,0,-9,-5,0,9],
// 4 0 -3 0 9 -3 0 -9 -1 0 -9 -1 0 9
  [4,0,-3,0,9,-3,0,-9,-1,0,-9,-1,0,9],
// 4 0 1 0 9 1 0 -9 3 0 -9 3 0 9
  [4,0,1,0,9,1,0,-9,3,0,-9,3,0,9],
// 4 0 5 0 9 5 0 -9 7 0 -9 7 0 9
  [4,0,5,0,9,5,0,-9,7,0,-9,7,0,9],
// 4 0 9 0 9 9 0 -9 11 0 -9 11 0 9
  [4,0,9,0,9,9,0,-9,11,0,-9,11,0,9],
// 4 0 13 0 9 13 0 -9 15 0 -9 15 0 9
  [4,0,13,0,9,13,0,-9,15,0,-9,15,0,9],
// 4 0 17 0 9 17 0 -9 19 0 -9 19 0 9
  [4,0,17,0,9,17,0,-9,19,0,-9,19,0,9],
// 3 16 -20 0 10 -19 0 9 -17 0 9
  [3,16,-20,0,10,-19,0,9,-17,0,9],
// 3 16 -20 0 10 -17 0 9 -15 0 9
  [3,16,-20,0,10,-17,0,9,-15,0,9],
// 3 16 -20 0 10 -15 0 9 -13 0 9
  [3,16,-20,0,10,-15,0,9,-13,0,9],
// 3 16 -20 0 10 -13 0 9 -11 0 9
  [3,16,-20,0,10,-13,0,9,-11,0,9],
// 3 16 -20 0 10 -11 0 9 -9 0 9
  [3,16,-20,0,10,-11,0,9,-9,0,9],
// 3 16 -20 0 10 -9 0 9 -7 0 9
  [3,16,-20,0,10,-9,0,9,-7,0,9],
// 3 16 -20 0 10 -7 0 9 -5 0 9
  [3,16,-20,0,10,-7,0,9,-5,0,9],
// 3 16 -20 0 10 -5 0 9 -3 0 9
  [3,16,-20,0,10,-5,0,9,-3,0,9],
// 3 16 -20 0 10 -3 0 9 -1 0 9
  [3,16,-20,0,10,-3,0,9,-1,0,9],
// 4 16 -20 0 10 -1 0 9 1 0 9 20 0 10
  [4,16,-20,0,10,-1,0,9,1,0,9,20,0,10],
// 3 16 20 0 10 1 0 9 3 0 9
  [3,16,20,0,10,1,0,9,3,0,9],
// 3 16 20 0 10 3 0 9 5 0 9
  [3,16,20,0,10,3,0,9,5,0,9],
// 3 16 20 0 10 5 0 9 7 0 9
  [3,16,20,0,10,5,0,9,7,0,9],
// 3 16 20 0 10 7 0 9 9 0 9
  [3,16,20,0,10,7,0,9,9,0,9],
// 3 16 20 0 10 9 0 9 11 0 9
  [3,16,20,0,10,9,0,9,11,0,9],
// 3 16 20 0 10 11 0 9 13 0 9
  [3,16,20,0,10,11,0,9,13,0,9],
// 3 16 20 0 10 13 0 9 15 0 9
  [3,16,20,0,10,13,0,9,15,0,9],
// 3 16 20 0 10 15 0 9 17 0 9
  [3,16,20,0,10,15,0,9,17,0,9],
// 3 16 20 0 10 17 0 9 19 0 9
  [3,16,20,0,10,17,0,9,19,0,9],
// 3 16 -17 0 -9 -19 0 -9 -20 0 -10
  [3,16,-17,0,-9,-19,0,-9,-20,0,-10],
// 3 16 -15 0 -9 -17 0 -9 -20 0 -10
  [3,16,-15,0,-9,-17,0,-9,-20,0,-10],
// 3 16 -13 0 -9 -15 0 -9 -20 0 -10
  [3,16,-13,0,-9,-15,0,-9,-20,0,-10],
// 3 16 -11 0 -9 -13 0 -9 -20 0 -10
  [3,16,-11,0,-9,-13,0,-9,-20,0,-10],
// 3 16 -9 0 -9 -11 0 -9 -20 0 -10
  [3,16,-9,0,-9,-11,0,-9,-20,0,-10],
// 3 16 -7 0 -9 -9 0 -9 -20 0 -10
  [3,16,-7,0,-9,-9,0,-9,-20,0,-10],
// 3 16 -5 0 -9 -7 0 -9 -20 0 -10
  [3,16,-5,0,-9,-7,0,-9,-20,0,-10],
// 3 16 -3 0 -9 -5 0 -9 -20 0 -10
  [3,16,-3,0,-9,-5,0,-9,-20,0,-10],
// 3 16 -1 0 -9 -3 0 -9 -20 0 -10
  [3,16,-1,0,-9,-3,0,-9,-20,0,-10],
// 4 16 1 0 -9 -1 0 -9 -20 0 -10 20 0 -10
  [4,16,1,0,-9,-1,0,-9,-20,0,-10,20,0,-10],
// 3 16 3 0 -9 1 0 -9 20 0 -10
  [3,16,3,0,-9,1,0,-9,20,0,-10],
// 3 16 5 0 -9 3 0 -9 20 0 -10
  [3,16,5,0,-9,3,0,-9,20,0,-10],
// 3 16 7 0 -9 5 0 -9 20 0 -10
  [3,16,7,0,-9,5,0,-9,20,0,-10],
// 3 16 9 0 -9 7 0 -9 20 0 -10
  [3,16,9,0,-9,7,0,-9,20,0,-10],
// 3 16 11 0 -9 9 0 -9 20 0 -10
  [3,16,11,0,-9,9,0,-9,20,0,-10],
// 3 16 13 0 -9 11 0 -9 20 0 -10
  [3,16,13,0,-9,11,0,-9,20,0,-10],
// 3 16 15 0 -9 13 0 -9 20 0 -10
  [3,16,15,0,-9,13,0,-9,20,0,-10],
// 3 16 17 0 -9 15 0 -9 20 0 -10
  [3,16,17,0,-9,15,0,-9,20,0,-10],
// 3 16 19 0 -9 17 0 -9 20 0 -10
  [3,16,19,0,-9,17,0,-9,20,0,-10],
];
module ldraw_lib__3069bp0h(step=0, col=false, unit=2/5, alt=false, line=0.2, solid=!$preview)
    makepoly(ldraw_lib__3069bp0h(solid), step=step, col=col, unit=unit, alt=alt, line=line, solid=solid);
ldraw_lib__3069bp0h(line=0.2);
